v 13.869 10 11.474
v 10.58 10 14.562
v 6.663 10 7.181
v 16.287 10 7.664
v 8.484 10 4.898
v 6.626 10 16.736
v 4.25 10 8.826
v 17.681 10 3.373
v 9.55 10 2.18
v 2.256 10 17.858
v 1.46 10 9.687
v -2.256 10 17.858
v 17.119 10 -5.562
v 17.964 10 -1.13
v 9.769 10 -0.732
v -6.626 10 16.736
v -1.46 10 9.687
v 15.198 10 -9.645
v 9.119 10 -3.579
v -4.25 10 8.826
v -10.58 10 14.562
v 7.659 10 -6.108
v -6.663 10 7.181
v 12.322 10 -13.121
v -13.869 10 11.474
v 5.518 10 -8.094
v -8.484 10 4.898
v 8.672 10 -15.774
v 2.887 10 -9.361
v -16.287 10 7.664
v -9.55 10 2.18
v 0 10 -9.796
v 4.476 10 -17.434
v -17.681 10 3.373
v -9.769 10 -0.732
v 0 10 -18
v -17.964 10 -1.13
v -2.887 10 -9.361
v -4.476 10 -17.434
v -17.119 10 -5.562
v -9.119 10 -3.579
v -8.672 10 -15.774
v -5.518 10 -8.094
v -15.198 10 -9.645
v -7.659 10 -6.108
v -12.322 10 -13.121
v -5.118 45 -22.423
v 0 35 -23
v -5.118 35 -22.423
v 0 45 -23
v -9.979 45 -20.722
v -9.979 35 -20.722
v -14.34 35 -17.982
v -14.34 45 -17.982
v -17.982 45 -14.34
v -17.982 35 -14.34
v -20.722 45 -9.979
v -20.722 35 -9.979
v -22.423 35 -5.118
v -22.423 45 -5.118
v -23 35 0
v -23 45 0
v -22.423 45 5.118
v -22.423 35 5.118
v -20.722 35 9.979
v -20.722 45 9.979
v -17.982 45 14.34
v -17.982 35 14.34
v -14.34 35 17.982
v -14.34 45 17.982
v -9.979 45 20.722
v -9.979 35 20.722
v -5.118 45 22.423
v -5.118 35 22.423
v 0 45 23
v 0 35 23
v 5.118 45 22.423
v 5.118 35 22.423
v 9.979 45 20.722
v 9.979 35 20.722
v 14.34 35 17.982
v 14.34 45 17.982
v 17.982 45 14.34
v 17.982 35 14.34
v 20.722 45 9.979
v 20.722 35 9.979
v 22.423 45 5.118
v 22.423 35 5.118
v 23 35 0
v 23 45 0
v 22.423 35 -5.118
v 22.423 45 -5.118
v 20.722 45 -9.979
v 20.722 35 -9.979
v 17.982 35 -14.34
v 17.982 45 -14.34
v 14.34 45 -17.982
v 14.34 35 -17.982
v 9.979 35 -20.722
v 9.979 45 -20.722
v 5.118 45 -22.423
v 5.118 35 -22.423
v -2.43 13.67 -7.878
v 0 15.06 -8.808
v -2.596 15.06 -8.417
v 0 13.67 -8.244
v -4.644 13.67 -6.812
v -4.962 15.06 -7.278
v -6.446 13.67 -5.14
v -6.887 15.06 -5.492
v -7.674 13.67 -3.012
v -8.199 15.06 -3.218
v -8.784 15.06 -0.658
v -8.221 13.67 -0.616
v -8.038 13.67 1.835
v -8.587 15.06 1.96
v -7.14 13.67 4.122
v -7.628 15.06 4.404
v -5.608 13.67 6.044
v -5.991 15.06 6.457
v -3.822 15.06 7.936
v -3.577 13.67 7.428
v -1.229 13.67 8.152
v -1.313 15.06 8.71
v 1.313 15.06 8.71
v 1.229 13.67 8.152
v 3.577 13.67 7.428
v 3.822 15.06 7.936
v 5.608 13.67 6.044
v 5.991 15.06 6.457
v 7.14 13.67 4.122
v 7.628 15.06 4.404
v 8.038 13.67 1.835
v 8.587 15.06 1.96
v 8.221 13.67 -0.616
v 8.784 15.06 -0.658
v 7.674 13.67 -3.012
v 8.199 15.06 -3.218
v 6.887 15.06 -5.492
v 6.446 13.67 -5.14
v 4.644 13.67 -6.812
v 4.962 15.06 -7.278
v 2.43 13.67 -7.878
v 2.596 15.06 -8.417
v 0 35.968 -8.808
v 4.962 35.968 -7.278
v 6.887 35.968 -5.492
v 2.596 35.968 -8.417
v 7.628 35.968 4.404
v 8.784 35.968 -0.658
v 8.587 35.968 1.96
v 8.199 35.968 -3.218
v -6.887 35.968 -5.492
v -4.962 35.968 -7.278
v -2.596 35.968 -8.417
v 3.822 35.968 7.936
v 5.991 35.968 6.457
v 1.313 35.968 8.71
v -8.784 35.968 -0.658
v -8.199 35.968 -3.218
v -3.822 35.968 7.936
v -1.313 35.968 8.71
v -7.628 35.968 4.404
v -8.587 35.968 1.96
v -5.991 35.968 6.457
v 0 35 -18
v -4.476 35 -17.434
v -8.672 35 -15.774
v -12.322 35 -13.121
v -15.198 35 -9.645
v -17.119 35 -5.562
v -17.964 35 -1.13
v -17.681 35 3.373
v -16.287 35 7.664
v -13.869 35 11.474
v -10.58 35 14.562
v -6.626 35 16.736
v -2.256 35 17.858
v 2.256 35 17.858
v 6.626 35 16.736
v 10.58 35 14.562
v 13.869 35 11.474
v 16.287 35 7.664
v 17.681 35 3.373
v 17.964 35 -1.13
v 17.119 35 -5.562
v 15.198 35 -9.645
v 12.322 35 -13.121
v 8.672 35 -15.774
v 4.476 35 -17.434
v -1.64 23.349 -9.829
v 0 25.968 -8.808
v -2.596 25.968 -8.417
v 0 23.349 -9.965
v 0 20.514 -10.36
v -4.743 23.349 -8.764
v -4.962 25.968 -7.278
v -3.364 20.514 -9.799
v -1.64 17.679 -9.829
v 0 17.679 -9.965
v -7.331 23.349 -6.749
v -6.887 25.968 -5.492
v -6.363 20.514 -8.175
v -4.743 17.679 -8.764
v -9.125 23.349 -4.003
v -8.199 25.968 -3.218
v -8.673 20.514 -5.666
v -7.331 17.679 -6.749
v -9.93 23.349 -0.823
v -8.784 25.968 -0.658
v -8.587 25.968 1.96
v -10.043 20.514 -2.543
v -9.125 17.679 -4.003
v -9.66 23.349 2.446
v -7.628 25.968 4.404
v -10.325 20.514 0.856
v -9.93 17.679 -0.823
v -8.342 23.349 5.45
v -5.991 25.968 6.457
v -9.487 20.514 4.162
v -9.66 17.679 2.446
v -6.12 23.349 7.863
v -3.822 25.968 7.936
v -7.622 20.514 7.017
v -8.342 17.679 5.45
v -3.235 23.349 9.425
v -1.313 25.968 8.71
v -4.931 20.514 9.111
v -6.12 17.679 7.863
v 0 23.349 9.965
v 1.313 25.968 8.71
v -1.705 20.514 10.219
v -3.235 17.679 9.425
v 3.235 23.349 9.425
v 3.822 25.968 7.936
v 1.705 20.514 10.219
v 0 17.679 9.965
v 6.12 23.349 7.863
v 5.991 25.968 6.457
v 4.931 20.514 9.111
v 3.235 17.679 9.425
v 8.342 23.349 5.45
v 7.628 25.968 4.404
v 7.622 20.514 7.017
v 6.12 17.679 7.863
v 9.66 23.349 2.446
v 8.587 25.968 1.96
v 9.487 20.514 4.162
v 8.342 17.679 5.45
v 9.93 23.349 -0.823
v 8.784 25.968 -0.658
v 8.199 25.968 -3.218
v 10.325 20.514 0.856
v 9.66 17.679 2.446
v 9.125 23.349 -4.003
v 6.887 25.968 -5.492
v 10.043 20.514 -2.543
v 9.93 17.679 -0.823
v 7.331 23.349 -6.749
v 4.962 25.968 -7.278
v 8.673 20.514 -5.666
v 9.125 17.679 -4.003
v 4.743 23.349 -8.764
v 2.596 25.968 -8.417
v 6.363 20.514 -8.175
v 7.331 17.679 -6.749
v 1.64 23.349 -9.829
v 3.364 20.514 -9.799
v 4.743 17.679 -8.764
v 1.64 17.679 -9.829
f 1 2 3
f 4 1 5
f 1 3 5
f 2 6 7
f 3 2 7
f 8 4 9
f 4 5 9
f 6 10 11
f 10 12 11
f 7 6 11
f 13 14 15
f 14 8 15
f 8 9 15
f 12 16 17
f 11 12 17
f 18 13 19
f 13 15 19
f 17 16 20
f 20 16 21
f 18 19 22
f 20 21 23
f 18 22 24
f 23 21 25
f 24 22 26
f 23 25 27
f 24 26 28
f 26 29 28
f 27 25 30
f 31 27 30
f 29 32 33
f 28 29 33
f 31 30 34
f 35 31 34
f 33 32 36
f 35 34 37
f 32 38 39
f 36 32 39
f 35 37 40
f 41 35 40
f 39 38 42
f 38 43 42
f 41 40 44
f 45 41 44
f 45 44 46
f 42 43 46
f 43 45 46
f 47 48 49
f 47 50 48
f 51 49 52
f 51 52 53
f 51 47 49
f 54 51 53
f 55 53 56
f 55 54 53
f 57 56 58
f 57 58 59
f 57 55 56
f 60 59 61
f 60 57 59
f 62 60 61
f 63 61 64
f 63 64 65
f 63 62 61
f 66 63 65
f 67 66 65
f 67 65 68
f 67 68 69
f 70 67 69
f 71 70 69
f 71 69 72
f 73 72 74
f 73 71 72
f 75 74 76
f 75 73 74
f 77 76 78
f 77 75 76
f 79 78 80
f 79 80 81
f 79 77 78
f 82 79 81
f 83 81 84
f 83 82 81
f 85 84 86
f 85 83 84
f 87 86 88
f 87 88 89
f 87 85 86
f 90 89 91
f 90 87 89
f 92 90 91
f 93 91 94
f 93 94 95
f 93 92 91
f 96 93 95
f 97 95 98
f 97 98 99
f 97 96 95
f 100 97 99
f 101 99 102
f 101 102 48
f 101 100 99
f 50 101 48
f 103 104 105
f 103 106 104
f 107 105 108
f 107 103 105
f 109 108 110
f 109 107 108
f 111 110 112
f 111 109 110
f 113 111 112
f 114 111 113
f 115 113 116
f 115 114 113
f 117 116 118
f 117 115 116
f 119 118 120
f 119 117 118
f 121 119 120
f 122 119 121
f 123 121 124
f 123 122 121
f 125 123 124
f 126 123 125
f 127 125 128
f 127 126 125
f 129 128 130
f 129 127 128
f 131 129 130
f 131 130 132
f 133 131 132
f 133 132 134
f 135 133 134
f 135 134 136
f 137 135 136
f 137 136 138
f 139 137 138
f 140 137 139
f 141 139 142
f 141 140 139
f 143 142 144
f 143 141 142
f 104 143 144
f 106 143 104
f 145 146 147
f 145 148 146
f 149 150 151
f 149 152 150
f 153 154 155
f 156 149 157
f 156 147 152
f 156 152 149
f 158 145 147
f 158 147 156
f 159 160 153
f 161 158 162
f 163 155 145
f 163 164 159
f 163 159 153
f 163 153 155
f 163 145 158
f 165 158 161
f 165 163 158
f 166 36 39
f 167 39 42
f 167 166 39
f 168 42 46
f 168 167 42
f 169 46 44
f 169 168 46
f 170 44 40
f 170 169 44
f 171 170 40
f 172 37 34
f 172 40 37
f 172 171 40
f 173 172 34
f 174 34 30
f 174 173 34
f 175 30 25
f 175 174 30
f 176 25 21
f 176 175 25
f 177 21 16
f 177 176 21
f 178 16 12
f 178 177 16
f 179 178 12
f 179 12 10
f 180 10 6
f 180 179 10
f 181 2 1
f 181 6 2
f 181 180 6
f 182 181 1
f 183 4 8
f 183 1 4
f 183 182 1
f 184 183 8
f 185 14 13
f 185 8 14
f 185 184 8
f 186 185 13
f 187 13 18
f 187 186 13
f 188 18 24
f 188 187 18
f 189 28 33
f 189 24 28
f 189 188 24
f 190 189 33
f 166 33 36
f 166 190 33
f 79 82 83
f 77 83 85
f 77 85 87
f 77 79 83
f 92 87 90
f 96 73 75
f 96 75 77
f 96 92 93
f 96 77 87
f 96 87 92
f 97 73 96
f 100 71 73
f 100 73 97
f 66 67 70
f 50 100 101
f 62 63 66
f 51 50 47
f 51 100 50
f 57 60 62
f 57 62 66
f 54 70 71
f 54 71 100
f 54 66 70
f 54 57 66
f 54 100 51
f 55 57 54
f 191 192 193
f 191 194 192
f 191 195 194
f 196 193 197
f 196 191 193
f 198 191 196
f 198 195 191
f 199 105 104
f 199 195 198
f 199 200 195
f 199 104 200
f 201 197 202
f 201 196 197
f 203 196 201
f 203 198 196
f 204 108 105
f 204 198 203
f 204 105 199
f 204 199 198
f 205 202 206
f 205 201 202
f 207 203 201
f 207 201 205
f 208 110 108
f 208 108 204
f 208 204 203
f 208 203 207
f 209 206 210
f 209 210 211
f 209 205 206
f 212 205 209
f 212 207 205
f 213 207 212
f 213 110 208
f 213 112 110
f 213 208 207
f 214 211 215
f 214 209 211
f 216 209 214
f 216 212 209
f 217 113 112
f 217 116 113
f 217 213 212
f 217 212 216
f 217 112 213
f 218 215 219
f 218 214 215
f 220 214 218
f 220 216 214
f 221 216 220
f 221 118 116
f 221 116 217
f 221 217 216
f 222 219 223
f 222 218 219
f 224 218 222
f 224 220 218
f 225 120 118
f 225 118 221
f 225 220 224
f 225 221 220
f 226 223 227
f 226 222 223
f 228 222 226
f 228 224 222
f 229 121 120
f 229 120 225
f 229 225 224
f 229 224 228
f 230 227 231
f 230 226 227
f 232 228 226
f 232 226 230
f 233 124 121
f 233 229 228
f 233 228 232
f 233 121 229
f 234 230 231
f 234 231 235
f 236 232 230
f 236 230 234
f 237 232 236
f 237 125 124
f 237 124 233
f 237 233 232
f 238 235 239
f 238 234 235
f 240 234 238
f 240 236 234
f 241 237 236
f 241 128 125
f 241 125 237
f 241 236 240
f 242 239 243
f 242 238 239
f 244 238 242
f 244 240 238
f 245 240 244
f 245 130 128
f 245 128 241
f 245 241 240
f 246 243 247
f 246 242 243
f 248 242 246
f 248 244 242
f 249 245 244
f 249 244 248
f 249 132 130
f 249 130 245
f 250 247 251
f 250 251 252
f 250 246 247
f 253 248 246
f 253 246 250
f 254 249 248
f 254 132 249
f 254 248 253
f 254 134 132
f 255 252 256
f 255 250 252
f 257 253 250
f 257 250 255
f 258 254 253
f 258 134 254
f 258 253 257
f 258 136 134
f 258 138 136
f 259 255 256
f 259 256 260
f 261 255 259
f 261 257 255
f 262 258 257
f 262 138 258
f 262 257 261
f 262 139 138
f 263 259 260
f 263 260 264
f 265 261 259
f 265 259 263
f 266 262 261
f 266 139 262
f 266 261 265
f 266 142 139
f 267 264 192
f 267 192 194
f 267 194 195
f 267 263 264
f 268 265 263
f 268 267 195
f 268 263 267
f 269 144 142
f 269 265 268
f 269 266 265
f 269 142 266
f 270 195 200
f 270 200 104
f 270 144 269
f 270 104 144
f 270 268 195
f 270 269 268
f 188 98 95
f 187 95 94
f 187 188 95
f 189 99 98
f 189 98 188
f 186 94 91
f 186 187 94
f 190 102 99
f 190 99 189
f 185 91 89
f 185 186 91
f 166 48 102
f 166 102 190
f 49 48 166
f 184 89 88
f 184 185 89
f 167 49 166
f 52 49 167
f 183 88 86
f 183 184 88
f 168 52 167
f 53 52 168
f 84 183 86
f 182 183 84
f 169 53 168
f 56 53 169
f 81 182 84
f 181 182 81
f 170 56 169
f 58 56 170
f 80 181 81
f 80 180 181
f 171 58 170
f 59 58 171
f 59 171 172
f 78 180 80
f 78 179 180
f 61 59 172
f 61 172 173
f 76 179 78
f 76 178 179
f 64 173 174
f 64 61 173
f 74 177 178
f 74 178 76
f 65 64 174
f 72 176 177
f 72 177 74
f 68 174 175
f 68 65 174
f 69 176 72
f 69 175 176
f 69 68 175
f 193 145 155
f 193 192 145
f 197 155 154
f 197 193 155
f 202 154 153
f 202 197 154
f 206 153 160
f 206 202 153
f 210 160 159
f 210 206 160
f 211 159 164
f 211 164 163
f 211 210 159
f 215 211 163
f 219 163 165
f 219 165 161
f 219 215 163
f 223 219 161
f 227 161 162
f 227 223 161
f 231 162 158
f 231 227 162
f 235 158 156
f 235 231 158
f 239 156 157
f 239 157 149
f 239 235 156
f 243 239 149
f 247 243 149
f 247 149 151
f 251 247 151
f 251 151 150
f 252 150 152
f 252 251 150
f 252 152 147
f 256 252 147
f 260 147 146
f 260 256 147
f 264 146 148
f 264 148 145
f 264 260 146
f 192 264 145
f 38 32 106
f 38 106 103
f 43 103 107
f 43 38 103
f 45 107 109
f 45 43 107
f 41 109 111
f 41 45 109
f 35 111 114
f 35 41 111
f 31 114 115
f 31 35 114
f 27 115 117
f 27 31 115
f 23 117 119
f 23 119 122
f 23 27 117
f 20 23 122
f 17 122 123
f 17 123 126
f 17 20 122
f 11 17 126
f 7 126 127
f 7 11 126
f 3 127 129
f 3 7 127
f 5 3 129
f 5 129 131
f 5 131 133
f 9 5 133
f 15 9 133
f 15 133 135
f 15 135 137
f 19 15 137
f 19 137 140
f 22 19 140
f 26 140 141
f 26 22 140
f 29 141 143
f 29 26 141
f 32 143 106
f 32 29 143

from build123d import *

# Parameters (mm, degrees)
CUT_EXTRUDE1_DEPTH      = 56.524769248
CUT_EXTRUDE1_DEPTH_BACK = 56.524769248
SKETCH2_W               = 36
SKETCH2_H               = 15


with BuildPart() as part:
    # Sketch1 → Revolve1 (revolve)
    with BuildSketch(Plane.XY, mode=Mode.PRIVATE) as revolve1_sk:
        with BuildLine():
            Line((8.808297686, 15.060389461), (8.244359234, 13.670434993))
            Line((8.244359234, 13.670434993), (16.137360004, -5))
            Line((16.137360004, -5), (18, -5))
            Line((18, -5), (18, 35))
            Line((18, 35), (23, 35))
            Line((23, 35), (23, 45))
            Line((23, 45), (18, 45))
            Line((18, 45), (0, 45))
            Line((0, 45), (0, 35.967908311))
            Line((0, 35.967908311), (8.808297686, 35.967908311))
            Line((8.808297686, 35.967908311), (8.808297686, 25.967908311))
            ThreePointArc((8.808297686, 25.967908311), (10.36, 20.514148886), (8.808297686, 15.060389461))
        make_face()
    revolve(revolve1_sk.sketch.rotate(Axis((0, 0, 0), (0, 1, 0)), 90), axis=Axis((0, 0, 0), (0, 1, 0)))

    # Sketch2 → Cut-Extrude1 (cut, two sides: drawn at the far end of the back side and taken through both)
    with BuildSketch(Plane(origin=(0, 0, 0), x_dir=(0, 0, -1), z_dir=(1, 0, 0)).offset(-CUT_EXTRUDE1_DEPTH_BACK)):
        with Locations((0, 2.5)):
            Rectangle(SKETCH2_W, SKETCH2_H)
    extrude(amount=CUT_EXTRUDE1_DEPTH + CUT_EXTRUDE1_DEPTH_BACK, mode=Mode.SUBTRACT)


solid = part.part
